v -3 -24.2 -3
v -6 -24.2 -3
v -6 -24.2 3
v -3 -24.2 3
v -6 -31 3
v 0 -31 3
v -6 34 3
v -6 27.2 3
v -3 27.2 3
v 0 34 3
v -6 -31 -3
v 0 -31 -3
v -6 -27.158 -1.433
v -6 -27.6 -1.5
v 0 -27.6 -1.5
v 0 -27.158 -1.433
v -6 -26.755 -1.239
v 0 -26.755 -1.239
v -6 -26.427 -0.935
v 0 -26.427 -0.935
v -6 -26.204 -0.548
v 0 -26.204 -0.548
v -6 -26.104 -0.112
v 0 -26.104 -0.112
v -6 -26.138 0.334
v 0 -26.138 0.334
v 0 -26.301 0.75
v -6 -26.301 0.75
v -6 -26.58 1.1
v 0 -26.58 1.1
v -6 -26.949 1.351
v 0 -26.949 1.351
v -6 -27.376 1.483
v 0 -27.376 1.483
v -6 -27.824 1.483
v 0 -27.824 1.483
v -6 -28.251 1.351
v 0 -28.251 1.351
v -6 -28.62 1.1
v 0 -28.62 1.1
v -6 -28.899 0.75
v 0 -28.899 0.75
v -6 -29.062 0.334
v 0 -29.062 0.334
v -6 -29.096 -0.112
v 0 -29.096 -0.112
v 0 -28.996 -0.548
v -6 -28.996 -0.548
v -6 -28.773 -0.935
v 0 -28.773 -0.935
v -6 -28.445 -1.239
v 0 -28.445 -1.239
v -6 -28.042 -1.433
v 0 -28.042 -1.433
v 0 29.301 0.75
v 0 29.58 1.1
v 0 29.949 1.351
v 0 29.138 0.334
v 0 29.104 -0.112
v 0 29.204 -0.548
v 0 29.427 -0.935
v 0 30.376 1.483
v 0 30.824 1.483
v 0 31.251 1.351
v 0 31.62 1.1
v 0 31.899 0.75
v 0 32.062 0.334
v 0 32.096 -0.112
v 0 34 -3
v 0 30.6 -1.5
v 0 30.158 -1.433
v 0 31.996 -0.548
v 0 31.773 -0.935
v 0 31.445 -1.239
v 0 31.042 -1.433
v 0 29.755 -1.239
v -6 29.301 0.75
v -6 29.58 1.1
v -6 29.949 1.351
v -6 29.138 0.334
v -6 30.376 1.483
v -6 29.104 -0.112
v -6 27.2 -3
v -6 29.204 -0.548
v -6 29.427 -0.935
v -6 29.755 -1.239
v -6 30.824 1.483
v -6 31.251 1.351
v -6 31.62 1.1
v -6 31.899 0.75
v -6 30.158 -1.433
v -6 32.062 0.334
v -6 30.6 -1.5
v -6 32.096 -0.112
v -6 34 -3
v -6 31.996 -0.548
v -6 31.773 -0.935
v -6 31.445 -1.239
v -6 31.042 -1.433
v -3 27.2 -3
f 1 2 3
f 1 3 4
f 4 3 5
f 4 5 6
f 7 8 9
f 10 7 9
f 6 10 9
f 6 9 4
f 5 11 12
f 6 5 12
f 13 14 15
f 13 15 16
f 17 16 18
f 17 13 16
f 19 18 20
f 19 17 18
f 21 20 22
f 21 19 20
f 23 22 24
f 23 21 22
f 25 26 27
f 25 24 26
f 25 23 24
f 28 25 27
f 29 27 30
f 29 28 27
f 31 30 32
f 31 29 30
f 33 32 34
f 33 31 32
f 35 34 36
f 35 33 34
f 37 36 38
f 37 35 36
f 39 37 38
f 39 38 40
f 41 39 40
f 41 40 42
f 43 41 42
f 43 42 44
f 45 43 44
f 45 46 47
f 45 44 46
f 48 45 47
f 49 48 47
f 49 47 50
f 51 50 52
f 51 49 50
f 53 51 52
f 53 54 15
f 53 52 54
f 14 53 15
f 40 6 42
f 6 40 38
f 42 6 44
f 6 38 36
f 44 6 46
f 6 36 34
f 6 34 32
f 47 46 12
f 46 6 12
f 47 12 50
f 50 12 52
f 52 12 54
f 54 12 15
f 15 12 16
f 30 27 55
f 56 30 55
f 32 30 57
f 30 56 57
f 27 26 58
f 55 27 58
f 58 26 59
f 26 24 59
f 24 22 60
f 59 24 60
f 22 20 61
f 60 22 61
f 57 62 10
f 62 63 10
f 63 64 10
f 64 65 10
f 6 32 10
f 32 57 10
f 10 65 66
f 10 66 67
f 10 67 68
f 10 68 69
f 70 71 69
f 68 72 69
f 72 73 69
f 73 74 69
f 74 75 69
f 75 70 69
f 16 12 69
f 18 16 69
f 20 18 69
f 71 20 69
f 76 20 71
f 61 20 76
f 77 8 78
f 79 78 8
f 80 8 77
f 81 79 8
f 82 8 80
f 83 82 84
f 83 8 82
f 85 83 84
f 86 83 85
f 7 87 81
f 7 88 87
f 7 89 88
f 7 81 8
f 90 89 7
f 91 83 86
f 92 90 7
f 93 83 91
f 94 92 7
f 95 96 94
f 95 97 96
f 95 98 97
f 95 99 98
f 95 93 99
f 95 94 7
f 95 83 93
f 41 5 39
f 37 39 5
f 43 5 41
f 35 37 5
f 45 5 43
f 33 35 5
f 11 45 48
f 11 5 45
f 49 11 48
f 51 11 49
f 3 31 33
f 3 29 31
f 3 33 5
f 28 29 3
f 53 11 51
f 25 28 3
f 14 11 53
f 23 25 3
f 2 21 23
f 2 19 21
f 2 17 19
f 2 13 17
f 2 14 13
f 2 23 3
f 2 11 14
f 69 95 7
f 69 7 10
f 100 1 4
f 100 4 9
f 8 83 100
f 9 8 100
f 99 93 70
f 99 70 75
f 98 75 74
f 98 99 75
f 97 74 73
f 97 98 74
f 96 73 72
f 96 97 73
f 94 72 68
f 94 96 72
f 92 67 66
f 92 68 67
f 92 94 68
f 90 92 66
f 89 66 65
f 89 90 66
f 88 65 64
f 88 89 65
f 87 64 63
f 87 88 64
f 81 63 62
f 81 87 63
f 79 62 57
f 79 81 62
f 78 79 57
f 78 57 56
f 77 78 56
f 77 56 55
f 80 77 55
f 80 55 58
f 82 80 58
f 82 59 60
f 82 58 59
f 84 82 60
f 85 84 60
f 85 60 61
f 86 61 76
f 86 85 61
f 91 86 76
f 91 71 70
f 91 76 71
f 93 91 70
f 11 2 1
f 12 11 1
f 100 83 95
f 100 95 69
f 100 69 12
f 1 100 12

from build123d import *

# Parameters (mm, degrees)
CYLINDER001_R     = 1.5
CYLINDER001_DEPTH = 14
CYLINDER_R        = 1.5
CYLINDER_DEPTH    = 14
BOX003_W          = 3
BOX003_H          = 6.8
BOX003_DEPTH      = 6
BOX002_W          = 3
BOX002_H          = 6.8
BOX002_DEPTH      = 6
BOX001_W          = 3
BOX001_H          = 65
BOX001_DEPTH      = 6


with BuildPart() as cylinder001:
    # Cylinder001 → Cylinder001 (new body)
    with BuildSketch(Plane(origin=(-13, 30.6, 0), x_dir=(0, 0, -1), z_dir=(1, 0, 0))):
        Circle(CYLINDER001_R)
    extrude(amount=CYLINDER001_DEPTH)


with BuildPart() as cylinder:
    # Cylinder → Cylinder (new body)
    with BuildSketch(Plane(origin=(-13, -27.6, 0), x_dir=(0, 0, -1), z_dir=(1, 0, 0))):
        Circle(CYLINDER_R)
    extrude(amount=CYLINDER_DEPTH)


with BuildPart() as cube003:
    # Box003 → Box003 (new body)
    with BuildSketch(Plane(origin=(-6, -31, -3), x_dir=(1, 0, 0), z_dir=(0, 0, 1))):
        with Locations((1.5, 3.4)):
            Rectangle(BOX003_W, BOX003_H)
    extrude(amount=BOX003_DEPTH)


with BuildPart() as cube002:
    # Box002 → Box002 (new body)
    with BuildSketch(Plane(origin=(-6, 27.2, -3), x_dir=(1, 0, 0), z_dir=(0, 0, 1))):
        with Locations((1.5, 3.4)):
            Rectangle(BOX002_W, BOX002_H)
    extrude(amount=BOX002_DEPTH)


with BuildPart() as cut002:
    # Box001 → Box001 (new body)
    with BuildSketch(Plane(origin=(-3, -31, -3), x_dir=(1, 0, 0), z_dir=(0, 0, 1))):
        with Locations((1.5, 32.5)):
            Rectangle(BOX001_W, BOX001_H)
    extrude(amount=BOX001_DEPTH)

    # Fusion: union Cube003, Cube002
    add(cube003.part)
    add(cube002.part)

    # Cut001: cut Cylinder
    add(cylinder.part, mode=Mode.SUBTRACT)

    # Cut002: cut Cylinder001
    add(cylinder001.part, mode=Mode.SUBTRACT)


solid = cut002.part
